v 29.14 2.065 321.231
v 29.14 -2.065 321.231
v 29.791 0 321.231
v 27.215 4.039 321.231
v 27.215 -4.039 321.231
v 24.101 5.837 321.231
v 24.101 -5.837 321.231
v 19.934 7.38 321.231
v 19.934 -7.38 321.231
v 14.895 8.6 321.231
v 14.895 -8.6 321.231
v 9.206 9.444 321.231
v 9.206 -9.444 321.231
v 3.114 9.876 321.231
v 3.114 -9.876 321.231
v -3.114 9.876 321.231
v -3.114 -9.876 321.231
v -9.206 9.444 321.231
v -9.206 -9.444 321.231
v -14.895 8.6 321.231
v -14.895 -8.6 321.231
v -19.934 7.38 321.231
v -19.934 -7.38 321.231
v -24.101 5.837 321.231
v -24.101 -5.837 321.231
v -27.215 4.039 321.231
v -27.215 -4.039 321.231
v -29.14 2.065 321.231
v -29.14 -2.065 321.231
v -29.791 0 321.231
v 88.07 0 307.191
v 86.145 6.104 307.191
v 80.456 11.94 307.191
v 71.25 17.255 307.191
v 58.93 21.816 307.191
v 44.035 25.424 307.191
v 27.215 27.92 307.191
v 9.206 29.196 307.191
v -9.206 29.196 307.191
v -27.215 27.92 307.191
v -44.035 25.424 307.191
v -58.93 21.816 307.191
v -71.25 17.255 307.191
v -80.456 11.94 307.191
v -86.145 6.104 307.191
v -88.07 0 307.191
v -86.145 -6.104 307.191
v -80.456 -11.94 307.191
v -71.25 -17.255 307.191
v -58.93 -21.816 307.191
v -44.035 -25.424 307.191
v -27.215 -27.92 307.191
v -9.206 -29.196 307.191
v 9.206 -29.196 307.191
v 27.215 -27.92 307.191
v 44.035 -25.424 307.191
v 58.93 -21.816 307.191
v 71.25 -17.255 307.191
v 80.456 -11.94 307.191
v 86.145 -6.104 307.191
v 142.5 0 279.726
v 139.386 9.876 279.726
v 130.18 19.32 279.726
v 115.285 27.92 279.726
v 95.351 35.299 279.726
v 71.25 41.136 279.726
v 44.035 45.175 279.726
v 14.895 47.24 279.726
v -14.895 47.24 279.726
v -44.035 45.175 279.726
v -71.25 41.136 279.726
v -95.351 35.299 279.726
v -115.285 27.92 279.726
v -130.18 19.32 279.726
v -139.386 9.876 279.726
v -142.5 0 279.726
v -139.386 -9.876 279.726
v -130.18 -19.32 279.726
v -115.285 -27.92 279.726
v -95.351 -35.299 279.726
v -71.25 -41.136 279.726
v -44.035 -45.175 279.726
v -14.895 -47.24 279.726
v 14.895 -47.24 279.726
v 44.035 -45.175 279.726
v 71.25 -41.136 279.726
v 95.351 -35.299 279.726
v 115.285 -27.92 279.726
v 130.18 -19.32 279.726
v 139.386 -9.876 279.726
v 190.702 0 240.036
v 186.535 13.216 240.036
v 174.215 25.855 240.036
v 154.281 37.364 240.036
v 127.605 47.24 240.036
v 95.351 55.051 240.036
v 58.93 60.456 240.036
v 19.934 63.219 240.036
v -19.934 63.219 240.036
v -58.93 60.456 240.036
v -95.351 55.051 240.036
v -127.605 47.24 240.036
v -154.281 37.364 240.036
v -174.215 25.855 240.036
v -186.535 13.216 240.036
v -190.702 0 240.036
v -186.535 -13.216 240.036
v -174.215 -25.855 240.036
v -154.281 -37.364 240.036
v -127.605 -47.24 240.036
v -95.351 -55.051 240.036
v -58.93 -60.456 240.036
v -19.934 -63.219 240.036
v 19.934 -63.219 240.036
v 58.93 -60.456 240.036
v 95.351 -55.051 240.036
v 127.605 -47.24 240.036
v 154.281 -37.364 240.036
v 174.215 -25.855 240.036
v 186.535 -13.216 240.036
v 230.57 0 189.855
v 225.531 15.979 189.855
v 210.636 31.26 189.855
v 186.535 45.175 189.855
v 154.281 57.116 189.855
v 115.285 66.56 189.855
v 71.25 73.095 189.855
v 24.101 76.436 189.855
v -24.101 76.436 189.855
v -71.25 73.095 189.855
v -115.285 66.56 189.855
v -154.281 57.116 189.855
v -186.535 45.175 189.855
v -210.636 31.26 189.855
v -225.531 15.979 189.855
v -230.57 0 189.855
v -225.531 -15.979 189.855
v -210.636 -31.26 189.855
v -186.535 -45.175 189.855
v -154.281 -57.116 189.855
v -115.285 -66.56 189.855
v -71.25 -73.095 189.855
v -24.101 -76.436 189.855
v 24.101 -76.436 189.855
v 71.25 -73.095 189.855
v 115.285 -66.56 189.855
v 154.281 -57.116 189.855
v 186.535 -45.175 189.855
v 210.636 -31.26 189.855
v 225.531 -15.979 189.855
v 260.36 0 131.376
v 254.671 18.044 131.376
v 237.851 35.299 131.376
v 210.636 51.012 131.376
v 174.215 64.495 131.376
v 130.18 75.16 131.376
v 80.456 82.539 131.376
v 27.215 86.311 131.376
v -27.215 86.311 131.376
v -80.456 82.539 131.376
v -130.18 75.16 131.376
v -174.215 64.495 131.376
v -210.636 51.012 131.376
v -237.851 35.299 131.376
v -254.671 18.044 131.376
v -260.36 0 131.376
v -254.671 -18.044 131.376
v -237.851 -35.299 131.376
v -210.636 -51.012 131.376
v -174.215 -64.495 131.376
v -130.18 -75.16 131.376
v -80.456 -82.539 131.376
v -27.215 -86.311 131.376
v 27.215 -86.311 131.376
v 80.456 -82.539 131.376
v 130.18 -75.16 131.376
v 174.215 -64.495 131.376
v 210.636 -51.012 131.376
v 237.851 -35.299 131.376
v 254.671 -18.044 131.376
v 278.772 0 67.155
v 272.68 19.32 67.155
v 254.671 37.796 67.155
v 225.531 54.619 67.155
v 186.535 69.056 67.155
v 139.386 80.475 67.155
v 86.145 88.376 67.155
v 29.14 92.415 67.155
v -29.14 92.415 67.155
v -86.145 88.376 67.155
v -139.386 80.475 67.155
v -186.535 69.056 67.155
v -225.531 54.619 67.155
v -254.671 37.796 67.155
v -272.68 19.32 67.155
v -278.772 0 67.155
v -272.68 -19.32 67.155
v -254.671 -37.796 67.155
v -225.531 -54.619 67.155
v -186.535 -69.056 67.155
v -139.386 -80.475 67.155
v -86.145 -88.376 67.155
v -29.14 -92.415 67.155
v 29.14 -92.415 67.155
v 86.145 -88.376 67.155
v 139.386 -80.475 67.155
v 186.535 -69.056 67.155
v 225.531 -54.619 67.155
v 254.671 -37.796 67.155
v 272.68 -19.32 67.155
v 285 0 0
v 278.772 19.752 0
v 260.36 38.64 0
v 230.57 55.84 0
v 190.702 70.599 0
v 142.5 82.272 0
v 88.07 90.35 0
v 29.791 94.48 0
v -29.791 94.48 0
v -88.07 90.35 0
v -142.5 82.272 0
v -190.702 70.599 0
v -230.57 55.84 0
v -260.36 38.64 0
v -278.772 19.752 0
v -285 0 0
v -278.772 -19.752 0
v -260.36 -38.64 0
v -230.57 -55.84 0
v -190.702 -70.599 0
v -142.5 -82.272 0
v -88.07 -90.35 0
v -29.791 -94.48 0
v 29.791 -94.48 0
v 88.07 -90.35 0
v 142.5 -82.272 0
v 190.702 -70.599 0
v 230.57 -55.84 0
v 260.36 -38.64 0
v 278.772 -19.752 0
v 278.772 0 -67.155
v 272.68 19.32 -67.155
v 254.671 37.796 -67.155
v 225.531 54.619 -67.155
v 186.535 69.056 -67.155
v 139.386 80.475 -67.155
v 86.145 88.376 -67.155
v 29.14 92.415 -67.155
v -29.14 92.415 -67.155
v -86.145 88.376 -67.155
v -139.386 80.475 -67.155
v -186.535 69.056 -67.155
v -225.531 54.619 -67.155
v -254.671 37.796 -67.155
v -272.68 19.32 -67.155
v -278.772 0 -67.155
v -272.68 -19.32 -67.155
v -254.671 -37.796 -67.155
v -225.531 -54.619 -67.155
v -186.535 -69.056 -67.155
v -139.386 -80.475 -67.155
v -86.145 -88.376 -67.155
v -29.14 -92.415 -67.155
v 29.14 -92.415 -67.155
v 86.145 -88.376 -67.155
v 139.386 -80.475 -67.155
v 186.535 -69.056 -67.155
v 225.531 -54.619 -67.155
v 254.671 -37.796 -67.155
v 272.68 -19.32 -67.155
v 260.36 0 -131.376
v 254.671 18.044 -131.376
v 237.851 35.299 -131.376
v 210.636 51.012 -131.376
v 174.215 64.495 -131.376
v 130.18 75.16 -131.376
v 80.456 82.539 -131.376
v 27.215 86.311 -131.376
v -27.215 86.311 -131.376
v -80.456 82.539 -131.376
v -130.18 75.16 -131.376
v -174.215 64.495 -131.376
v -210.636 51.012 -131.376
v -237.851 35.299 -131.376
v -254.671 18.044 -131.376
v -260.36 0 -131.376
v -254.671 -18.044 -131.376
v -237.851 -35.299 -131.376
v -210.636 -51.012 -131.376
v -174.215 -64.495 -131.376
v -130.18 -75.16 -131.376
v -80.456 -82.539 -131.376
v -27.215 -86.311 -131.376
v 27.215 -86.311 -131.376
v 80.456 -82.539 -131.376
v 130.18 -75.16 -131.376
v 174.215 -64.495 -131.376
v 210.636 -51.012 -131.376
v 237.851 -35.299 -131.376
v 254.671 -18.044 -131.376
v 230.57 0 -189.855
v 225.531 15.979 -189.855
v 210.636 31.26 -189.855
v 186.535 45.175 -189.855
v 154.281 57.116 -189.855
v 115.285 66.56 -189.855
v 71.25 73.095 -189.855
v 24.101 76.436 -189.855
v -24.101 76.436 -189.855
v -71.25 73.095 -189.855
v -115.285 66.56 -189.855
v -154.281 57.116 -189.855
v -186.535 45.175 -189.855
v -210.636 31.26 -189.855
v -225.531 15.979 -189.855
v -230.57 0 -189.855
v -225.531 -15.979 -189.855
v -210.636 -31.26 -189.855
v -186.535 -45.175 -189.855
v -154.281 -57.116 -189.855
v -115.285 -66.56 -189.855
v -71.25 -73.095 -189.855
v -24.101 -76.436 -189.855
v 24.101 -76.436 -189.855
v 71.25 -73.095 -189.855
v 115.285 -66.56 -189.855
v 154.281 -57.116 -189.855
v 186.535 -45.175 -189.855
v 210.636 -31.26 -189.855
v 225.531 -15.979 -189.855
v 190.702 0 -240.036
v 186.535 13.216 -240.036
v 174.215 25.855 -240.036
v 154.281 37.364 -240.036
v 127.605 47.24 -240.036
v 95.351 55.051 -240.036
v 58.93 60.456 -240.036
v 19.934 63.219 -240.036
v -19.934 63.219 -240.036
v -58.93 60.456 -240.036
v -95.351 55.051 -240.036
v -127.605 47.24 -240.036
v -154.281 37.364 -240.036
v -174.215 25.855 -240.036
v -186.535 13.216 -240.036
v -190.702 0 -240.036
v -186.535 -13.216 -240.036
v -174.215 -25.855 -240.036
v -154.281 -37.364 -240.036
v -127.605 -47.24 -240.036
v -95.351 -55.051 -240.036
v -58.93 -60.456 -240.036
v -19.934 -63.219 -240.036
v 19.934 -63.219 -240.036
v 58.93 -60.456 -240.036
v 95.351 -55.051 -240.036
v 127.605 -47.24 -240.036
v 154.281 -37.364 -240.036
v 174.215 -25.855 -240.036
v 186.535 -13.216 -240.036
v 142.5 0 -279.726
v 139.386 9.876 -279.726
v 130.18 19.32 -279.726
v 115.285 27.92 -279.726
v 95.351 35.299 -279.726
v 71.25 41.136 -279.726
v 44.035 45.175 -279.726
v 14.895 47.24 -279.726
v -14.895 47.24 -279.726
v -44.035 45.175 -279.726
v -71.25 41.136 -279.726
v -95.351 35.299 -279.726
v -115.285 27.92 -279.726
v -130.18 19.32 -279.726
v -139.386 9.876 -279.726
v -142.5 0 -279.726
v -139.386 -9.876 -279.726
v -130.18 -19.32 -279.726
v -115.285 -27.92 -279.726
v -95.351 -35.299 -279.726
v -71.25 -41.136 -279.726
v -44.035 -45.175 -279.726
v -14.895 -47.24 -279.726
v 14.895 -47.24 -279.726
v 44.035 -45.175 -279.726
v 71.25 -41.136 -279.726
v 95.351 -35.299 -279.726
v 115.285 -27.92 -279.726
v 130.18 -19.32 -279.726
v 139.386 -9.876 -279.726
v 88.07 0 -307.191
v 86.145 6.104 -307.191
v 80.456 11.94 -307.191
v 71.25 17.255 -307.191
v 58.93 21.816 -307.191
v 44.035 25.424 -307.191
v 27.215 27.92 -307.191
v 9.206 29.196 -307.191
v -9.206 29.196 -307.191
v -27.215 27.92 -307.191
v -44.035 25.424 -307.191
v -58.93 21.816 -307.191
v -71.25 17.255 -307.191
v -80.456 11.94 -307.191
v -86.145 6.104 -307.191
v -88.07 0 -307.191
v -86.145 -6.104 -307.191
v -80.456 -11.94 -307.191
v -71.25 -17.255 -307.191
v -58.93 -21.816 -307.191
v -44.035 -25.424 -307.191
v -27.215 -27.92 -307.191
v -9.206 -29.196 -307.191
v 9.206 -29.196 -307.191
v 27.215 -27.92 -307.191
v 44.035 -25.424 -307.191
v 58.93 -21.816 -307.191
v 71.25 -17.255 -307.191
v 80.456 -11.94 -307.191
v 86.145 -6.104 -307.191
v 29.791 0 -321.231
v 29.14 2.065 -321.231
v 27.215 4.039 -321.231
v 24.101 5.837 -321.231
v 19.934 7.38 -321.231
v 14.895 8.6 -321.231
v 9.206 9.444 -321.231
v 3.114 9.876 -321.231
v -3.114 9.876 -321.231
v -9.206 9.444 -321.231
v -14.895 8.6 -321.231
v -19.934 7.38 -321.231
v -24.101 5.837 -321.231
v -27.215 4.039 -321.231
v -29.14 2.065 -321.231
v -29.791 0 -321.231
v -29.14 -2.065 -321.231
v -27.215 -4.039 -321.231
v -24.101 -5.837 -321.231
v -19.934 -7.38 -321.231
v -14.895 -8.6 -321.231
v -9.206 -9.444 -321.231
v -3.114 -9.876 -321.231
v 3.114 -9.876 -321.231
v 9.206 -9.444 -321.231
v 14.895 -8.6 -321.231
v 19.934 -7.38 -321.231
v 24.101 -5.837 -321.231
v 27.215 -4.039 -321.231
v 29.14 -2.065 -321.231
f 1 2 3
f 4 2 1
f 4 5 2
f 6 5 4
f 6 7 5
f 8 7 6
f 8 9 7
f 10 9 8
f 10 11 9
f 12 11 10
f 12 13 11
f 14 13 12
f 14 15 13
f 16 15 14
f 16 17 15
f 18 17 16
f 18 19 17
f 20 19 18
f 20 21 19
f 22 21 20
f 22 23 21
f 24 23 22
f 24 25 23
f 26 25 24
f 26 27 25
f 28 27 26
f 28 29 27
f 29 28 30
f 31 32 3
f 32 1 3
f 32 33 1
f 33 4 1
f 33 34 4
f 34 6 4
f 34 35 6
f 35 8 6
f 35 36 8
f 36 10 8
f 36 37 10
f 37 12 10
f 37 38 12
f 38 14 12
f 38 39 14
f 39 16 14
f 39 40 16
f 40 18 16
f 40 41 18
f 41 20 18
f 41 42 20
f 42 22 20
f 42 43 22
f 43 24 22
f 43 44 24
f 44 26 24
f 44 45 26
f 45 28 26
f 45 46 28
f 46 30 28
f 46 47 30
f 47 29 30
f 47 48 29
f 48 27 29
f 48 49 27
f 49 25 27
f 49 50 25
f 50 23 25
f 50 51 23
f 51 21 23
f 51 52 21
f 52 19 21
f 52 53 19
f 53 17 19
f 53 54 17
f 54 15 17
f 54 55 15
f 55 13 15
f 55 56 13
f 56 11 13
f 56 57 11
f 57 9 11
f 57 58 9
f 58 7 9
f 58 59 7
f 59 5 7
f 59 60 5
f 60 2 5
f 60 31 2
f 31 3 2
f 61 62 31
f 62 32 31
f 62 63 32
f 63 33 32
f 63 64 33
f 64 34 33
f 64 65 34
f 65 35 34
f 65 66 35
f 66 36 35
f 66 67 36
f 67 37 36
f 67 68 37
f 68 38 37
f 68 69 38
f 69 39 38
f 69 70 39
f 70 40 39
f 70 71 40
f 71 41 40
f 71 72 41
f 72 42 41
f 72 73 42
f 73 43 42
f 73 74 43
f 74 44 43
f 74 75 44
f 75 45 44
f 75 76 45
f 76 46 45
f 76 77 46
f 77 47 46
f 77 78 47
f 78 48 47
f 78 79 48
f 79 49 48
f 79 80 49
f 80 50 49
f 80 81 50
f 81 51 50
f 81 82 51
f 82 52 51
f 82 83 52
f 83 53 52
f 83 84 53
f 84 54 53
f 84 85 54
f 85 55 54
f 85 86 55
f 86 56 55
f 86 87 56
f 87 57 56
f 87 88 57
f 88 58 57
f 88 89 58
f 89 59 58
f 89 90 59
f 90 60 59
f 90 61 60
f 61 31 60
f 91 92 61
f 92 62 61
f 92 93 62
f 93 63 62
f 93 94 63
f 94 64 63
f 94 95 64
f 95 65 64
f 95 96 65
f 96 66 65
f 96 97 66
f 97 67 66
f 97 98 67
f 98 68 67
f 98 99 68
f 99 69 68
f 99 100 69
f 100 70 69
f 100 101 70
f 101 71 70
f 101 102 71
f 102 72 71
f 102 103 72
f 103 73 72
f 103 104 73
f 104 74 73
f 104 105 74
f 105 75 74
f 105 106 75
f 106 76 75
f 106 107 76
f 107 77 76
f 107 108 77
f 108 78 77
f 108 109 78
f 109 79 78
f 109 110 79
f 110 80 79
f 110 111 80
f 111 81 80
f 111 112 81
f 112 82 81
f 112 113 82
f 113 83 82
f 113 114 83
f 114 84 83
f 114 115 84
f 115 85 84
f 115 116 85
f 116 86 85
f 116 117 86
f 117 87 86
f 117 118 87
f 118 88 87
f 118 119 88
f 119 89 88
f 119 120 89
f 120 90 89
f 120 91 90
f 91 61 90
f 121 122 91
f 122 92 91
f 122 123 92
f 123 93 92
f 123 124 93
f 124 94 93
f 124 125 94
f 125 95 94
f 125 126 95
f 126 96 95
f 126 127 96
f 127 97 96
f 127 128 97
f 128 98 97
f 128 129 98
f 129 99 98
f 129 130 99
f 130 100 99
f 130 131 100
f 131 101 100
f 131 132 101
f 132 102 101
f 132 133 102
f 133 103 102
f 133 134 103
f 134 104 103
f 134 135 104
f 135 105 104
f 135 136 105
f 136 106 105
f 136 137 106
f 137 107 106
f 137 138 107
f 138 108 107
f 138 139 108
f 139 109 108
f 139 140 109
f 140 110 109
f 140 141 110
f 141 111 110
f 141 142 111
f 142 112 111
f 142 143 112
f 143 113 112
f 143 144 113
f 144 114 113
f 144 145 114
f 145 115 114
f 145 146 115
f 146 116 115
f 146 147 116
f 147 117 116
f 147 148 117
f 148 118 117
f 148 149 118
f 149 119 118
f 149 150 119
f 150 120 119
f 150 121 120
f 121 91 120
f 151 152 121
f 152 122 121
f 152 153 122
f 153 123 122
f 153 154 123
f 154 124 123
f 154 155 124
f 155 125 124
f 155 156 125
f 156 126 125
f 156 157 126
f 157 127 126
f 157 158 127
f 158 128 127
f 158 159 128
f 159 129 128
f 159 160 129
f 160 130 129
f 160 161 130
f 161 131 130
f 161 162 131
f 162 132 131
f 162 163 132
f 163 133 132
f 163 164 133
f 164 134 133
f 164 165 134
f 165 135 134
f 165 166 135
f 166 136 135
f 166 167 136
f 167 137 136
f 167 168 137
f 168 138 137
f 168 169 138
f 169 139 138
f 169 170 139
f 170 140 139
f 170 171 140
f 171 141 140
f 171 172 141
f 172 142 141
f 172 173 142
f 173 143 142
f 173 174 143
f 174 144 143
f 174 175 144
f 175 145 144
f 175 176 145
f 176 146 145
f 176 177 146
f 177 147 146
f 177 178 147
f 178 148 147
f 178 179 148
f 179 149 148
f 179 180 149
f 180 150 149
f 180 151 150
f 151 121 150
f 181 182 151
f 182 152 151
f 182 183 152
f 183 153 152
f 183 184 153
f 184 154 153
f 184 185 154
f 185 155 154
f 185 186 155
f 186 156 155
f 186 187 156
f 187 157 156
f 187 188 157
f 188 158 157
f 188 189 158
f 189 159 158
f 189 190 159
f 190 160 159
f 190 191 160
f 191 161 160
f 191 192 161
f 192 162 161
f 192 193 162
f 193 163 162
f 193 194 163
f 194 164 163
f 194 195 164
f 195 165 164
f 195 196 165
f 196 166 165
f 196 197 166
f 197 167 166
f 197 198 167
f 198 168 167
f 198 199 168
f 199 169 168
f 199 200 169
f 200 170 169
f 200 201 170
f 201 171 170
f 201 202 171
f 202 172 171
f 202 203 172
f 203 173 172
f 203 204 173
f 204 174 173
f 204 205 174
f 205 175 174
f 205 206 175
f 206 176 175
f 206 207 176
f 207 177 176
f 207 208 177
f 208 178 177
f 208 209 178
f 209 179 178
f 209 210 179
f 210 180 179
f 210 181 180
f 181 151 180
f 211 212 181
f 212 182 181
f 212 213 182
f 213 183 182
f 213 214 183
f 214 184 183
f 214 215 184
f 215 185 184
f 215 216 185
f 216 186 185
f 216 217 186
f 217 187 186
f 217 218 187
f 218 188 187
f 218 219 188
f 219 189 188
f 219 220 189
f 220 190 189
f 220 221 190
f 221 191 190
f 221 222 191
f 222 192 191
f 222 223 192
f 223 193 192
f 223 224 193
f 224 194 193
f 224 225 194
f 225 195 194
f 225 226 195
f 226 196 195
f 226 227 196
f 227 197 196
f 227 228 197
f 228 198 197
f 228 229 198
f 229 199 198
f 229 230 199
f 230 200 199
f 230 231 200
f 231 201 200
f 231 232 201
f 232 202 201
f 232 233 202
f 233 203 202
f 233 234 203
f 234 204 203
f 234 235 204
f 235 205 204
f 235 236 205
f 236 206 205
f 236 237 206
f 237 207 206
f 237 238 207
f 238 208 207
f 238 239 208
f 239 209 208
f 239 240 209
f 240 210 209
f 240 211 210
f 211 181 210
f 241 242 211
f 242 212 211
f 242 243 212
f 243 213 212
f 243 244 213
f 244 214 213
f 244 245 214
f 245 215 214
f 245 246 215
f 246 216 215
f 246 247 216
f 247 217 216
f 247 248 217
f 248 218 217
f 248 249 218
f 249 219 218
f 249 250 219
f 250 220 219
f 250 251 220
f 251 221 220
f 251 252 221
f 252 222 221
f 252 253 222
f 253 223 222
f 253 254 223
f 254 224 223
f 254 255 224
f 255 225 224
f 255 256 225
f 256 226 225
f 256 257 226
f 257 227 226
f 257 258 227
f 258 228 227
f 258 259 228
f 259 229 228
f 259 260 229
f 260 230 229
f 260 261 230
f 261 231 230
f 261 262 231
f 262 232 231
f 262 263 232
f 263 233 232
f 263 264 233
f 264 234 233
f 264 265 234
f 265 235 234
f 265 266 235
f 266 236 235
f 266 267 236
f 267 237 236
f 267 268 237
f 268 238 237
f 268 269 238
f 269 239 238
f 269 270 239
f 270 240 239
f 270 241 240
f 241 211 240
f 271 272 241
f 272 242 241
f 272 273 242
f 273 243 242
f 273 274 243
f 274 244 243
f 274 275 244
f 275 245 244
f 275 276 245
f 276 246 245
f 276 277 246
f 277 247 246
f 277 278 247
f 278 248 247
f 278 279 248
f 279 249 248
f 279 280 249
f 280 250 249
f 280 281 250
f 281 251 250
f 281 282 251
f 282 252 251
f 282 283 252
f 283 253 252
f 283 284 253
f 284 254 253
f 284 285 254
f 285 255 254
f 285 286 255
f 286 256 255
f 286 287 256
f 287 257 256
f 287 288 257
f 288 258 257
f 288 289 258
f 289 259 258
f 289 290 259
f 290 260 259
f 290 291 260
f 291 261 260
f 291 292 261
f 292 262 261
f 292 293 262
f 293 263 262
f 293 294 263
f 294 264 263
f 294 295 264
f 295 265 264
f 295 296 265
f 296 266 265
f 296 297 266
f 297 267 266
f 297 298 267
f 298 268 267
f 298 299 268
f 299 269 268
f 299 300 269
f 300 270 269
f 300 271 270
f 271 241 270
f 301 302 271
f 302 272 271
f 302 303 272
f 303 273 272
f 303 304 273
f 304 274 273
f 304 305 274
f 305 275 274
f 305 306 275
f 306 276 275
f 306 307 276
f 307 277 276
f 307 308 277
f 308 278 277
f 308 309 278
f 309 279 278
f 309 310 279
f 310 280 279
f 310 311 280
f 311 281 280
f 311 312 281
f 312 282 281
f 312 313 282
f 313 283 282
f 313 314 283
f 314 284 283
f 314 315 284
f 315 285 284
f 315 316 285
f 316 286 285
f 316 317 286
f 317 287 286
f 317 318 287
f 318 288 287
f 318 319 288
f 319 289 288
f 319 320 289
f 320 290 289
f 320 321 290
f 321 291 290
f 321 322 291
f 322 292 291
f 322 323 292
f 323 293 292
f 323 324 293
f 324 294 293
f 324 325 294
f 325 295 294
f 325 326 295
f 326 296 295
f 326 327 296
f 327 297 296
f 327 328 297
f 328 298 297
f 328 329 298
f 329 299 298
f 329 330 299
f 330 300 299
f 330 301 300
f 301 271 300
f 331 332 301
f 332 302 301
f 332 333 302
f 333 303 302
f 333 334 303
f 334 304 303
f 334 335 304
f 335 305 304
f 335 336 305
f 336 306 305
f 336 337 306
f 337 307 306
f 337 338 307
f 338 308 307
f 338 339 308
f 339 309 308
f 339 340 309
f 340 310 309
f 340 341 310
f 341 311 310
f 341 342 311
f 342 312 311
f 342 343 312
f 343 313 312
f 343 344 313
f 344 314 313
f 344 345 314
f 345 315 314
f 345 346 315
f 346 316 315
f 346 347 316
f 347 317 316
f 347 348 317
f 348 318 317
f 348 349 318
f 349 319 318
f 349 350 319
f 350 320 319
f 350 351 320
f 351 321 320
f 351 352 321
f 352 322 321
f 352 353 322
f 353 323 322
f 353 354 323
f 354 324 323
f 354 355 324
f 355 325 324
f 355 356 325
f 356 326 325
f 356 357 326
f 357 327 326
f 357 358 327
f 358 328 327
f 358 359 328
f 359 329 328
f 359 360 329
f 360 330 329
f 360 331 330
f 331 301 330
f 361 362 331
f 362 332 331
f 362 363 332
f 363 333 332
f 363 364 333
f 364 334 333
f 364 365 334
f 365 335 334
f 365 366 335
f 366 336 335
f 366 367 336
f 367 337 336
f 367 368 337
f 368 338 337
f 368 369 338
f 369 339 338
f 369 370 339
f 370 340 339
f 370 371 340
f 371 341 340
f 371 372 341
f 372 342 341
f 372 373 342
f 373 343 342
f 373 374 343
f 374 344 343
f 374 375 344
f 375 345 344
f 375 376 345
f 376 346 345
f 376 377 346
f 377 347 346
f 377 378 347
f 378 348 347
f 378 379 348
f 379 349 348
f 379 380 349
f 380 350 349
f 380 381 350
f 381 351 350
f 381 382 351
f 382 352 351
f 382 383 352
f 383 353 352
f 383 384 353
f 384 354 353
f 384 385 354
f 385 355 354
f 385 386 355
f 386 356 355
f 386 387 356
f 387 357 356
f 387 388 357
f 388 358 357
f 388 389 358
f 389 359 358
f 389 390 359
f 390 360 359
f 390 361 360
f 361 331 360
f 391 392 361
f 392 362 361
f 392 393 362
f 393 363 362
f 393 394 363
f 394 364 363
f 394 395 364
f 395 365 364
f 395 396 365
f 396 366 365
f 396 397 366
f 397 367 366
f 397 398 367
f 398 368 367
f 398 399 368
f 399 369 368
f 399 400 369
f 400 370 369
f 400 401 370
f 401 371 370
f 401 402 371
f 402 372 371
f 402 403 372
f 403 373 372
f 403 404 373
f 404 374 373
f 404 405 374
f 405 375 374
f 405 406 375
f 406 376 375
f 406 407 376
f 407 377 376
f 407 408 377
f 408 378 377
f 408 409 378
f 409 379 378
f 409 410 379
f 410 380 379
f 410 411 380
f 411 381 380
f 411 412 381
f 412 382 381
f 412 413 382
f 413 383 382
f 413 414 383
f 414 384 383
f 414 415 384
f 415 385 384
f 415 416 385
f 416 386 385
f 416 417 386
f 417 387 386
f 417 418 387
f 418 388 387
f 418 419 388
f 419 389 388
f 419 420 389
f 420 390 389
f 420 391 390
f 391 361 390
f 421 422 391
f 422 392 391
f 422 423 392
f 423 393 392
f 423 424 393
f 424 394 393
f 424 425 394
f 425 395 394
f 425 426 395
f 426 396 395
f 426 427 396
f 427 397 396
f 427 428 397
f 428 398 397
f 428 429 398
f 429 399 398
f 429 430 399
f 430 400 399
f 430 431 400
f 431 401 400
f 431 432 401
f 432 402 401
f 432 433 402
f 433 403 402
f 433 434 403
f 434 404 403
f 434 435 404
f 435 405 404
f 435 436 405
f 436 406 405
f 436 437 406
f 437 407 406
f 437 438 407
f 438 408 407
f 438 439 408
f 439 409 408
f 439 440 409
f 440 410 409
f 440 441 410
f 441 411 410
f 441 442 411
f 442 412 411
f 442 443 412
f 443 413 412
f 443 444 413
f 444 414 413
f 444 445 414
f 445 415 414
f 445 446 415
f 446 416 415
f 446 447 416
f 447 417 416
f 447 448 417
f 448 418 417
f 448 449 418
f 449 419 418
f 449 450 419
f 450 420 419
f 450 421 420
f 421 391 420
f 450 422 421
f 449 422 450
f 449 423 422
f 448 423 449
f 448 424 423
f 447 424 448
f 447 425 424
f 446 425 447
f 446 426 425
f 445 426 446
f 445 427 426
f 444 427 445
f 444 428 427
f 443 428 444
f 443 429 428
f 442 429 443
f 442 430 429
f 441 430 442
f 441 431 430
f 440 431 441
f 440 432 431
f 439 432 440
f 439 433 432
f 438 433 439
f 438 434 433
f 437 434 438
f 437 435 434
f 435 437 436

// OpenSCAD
// Generated by SolidPython 1.0.1 on 2020-07-29 00:46:51


scale(v = [15, 5, 17]) {
	sphere(r = 19);
}
/***********************************************
*********      SolidPython code:      **********
************************************************
 
# import packages: SolidPython
from solid import *
from solid.utils import *
from itertools import chain, combinations, permutations


class Resize:

    def __init__(self, scad_file):
        self.scad_file = scad_file
        #self.scad_file = import_scad(scad_file)
        # cone/cylinder param:
        self.r1 = 0
        self.r2 = 0
        self.h = 0
        # rectangular prism param:
        self.w = 0
        self.l = 0
        # ellipse param:
        self.r = 0

    # import OpenScad code (file name corresponds to shape)


    # classify shape + parameters
    def assign(self, param1, param2, param3):
        if self.scad_file == 'cone.scad':
            self.r1 = param1
            self.r2 = param2
            self.h = param3
        elif self.scad_file == 'cylinder.scad':
            self.r1 = param1
            self.r2 = param2
            self.h = param3
        elif self.scad_file == 'rectangularPrism.scad':
            self.h = param1
            self.l = param2
            self.w = param3
        else:
            self.r = param1
            self.h = param2

    # resize parameters
    def iterate(self):
        x = range(3, 20, 2)
        i = 1
        if self.scad_file == 'cone.scad':
            tempList = list(permutations(x, 2))
            for temp in tempList:
                param1 = temp[0]
                param2 = temp[1]
                filepath = 'produced_scad_files/' + 'cone' + str(param1) + '_' + str(param2) + '_' + '.scad'
                scad_render_to_file(cylinder(h=param1, r1=param2, r2=0), filepath)

        elif self.scad_file == 'cylinder.scad':
            tempList = list(permutations(x, 3))
            for temp in tempList:
                param1 = temp[0]
                param2 = temp[1]
                filepath = 'produced_scad_files/' + 'cylinder' + str(param1) + '_' + str(param2) + '_' + '.scad'
                scad_render_to_file(cylinder(h=param1, r1=param2, r2=param2), filepath)

        elif self.scad_file == 'rectangularPrism.scad':
            tempList = list(permutations(x, 3))
            for temp in tempList:
                param1 = temp[0]
                param2 = temp[1]
                param3 = temp[2]
                filepath = 'produced_scad_files/' + 'rectangularPrism' + str(param1) + '_' + str(param2) + '_' + str(
                    param3) + '.scad'
                scad_render_to_file(cube(size=(param1, param2, param3)), filepath)

        elif self.scad_file == 'ellipse.scad':
            tempList = list(permutations(x, 4))
            for temp in tempList:
                param1 = temp[0]
                param2 = temp[1]
                param3 = temp[2]
                param4 = temp[3]
                filepath = 'produced_scad_files/' + 'ellipse' + str(param1) + '_' + str(param2) + '_' + str(param3) + '_' + str(param4) + '.scad'
                scad_render_to_file(scale([param1, param2, param3])(sphere(r=param4)), filepath)

    def render_to_scadfile(self):
        scad_render_to_file(scad, 'example.scad') 
 
************************************************/
